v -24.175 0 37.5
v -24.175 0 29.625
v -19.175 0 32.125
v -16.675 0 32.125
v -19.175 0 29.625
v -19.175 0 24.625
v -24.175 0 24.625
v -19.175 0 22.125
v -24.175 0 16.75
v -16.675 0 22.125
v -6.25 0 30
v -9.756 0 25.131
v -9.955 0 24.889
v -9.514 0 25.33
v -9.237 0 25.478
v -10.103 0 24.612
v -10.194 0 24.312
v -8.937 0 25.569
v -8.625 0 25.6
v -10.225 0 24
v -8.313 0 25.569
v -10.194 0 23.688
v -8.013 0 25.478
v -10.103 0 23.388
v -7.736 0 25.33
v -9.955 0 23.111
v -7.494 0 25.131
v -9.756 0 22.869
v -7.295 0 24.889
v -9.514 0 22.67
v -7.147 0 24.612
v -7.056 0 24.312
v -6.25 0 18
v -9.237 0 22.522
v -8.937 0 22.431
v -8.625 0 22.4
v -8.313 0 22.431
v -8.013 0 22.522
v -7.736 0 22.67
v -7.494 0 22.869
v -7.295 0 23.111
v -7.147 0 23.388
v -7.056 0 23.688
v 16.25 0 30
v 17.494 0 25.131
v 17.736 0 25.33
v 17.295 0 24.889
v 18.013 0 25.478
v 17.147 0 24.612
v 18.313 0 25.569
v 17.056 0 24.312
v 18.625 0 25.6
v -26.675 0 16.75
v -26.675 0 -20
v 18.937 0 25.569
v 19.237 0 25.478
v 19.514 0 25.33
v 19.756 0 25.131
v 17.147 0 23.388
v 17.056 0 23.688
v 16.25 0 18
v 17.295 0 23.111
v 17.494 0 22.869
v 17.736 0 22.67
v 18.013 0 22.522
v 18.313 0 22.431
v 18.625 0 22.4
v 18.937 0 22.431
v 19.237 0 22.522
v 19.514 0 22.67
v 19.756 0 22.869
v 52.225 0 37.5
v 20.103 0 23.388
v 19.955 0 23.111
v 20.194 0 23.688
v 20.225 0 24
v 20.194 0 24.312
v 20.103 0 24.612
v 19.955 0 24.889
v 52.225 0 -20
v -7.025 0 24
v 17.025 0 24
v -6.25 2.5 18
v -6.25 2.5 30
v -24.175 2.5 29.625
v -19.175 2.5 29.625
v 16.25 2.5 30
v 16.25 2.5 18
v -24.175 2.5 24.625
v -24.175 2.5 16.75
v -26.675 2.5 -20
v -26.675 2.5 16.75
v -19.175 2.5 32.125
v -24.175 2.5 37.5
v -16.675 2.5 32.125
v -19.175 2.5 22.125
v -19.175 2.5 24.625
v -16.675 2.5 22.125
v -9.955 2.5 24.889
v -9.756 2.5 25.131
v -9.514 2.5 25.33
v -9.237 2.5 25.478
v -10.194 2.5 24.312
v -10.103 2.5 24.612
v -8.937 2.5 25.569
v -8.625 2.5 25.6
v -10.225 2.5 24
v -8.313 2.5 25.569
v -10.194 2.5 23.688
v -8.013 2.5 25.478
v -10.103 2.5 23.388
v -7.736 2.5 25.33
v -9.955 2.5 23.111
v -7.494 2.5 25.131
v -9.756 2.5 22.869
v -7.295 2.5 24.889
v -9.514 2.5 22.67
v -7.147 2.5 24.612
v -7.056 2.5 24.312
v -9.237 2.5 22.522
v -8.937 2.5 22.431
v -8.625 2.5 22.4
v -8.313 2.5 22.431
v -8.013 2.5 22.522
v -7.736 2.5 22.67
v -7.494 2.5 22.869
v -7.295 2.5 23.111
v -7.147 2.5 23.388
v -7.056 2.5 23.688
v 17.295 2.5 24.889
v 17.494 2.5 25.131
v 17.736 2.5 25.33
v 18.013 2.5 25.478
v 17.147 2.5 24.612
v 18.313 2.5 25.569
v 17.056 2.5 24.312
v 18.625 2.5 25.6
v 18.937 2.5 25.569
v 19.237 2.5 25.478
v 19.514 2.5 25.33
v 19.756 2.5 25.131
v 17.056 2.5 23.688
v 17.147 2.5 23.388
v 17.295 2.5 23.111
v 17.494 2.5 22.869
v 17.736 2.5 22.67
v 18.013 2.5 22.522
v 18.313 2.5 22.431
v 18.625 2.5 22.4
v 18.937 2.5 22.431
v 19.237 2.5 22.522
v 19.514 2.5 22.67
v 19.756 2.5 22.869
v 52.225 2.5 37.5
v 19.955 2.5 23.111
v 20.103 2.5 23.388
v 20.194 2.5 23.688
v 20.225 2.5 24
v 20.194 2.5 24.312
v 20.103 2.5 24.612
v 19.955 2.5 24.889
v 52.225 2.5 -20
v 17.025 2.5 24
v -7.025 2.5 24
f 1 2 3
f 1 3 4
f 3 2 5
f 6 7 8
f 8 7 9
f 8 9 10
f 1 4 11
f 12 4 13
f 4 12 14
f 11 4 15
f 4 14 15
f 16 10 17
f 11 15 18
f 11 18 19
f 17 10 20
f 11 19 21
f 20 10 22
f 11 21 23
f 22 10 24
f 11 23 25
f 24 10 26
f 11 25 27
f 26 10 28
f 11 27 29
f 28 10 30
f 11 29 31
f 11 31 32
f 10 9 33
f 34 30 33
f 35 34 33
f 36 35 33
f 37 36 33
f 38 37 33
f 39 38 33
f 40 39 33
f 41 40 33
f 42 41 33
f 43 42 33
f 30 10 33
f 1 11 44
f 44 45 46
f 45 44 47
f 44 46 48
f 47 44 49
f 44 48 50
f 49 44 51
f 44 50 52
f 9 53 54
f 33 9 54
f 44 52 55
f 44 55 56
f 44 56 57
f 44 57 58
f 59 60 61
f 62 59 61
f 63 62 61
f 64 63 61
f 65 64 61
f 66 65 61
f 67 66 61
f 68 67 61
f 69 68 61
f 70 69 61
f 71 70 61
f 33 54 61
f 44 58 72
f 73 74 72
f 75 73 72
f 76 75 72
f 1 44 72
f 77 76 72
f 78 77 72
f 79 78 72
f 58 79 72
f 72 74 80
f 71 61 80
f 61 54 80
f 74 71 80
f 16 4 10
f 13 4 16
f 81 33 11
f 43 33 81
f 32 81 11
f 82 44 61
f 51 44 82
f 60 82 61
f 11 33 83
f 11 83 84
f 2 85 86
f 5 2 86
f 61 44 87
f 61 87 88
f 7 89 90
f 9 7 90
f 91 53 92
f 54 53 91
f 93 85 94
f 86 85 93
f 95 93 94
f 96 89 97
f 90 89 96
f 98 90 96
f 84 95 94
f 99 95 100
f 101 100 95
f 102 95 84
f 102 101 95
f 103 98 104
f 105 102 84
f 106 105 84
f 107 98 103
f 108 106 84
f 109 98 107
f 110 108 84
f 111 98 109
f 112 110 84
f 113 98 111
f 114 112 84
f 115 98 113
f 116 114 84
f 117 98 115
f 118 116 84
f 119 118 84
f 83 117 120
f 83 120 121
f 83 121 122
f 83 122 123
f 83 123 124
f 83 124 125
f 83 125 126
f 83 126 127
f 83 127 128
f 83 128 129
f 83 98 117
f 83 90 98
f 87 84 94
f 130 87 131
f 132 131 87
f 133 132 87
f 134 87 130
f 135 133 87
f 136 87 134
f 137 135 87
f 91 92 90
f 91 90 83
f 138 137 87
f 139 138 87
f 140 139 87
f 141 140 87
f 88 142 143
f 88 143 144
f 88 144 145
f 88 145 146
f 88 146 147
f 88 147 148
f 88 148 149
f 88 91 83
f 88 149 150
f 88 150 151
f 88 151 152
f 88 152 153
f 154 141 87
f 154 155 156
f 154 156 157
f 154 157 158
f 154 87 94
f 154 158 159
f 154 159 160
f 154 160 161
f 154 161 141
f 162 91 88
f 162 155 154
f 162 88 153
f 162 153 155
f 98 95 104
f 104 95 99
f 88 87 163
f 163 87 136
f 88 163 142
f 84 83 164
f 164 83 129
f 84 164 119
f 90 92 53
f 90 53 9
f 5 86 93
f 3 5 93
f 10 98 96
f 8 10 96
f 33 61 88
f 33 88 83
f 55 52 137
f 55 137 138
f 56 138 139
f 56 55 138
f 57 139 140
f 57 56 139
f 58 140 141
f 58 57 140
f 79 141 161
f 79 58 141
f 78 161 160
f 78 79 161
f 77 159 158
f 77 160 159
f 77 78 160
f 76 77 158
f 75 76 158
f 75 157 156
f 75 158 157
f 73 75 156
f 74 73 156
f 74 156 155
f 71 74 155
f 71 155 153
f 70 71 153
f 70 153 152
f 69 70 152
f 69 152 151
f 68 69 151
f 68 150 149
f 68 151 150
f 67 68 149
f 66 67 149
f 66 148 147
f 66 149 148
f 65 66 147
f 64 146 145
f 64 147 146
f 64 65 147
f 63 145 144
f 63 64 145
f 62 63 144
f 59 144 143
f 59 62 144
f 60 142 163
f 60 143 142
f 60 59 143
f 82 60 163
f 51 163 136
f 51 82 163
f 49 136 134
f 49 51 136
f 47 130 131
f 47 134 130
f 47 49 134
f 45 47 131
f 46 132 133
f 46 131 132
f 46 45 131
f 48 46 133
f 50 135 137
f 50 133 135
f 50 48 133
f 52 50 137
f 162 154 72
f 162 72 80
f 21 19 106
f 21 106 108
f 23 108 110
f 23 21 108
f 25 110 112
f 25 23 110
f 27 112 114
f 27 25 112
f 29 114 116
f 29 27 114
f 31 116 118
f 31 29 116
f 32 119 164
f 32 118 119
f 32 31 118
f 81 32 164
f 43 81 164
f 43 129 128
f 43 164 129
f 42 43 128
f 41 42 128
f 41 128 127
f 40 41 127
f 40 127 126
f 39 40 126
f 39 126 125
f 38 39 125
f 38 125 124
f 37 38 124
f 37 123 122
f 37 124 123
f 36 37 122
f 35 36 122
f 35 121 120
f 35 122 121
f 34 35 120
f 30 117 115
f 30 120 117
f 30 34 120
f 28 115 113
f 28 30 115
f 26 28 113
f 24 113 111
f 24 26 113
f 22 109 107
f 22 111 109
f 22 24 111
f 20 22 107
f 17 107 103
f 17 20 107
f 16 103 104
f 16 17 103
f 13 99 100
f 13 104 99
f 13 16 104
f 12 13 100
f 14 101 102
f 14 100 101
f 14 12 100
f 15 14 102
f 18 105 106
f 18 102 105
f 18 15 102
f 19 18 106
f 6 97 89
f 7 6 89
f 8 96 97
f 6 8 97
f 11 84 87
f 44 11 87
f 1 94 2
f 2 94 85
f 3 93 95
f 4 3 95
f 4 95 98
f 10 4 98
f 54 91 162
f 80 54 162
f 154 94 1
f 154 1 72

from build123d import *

# Parameters (mm, degrees)
SKETCH1_W               = 80
SKETCH1_H               = 60
BOSS_EXTRUDE1_DEPTH     = 2.5
CUT_EXTRUDE4_DEPTH      = 51.062460986
CUT_EXTRUDE4_DEPTH_BACK = 51.062460986
SKETCH2_R               = 1.6
SKETCH3_W               = 2.5
SKETCH3_H               = 20.5
BOSS_EXTRUDE2_DEPTH     = 66.5
SKETCH4_W               = 80
SKETCH4_H               = 5.5
BOSS_EXTRUDE3_DEPTH     = 2.5
SKETCH5_W               = 2.5
SKETCH5_H               = 5.5
BOSS_EXTRUDE4_DEPTH     = 66.5
SKETCH6_W               = 2.5
SKETCH6_H               = 5.5
CUT_EXTRUDE5_DEPTH      = 66.5
SKETCH9_W               = 2.5
SKETCH9_H               = 2.5
BOSS_EXTRUDE5_DEPTH     = 66.5
SKETCH11_R              = 4.75
CUT_EXTRUDE6_DEPTH      = 2.5
SKETCH15_W              = 2.5
SKETCH15_H              = 23
BOSS_EXTRUDE6_DEPTH     = 8
SKETCH17_W              = 2.5
SKETCH17_H              = 74.5
BOSS_EXTRUDE7_DEPTH     = 2
SKETCH18_R              = 1.6
CUT_EXTRUDE7_DEPTH      = 2.5
SKETCH21_W              = 80
SKETCH21_H              = 2.5
BOSS_EXTRUDE8_DEPTH     = 2
SKETCH22_W              = 4.25
SKETCH22_H              = 74.5
CUT_EXTRUDE8_DEPTH      = 2.5
FILLET1_R               = 5
SKETCH23_W              = 15.225
SKETCH23_H              = 67.5
BOSS_EXTRUDE10_DEPTH    = 2.5
SKETCH24_W              = 95.225
SKETCH24_H              = 10
CUT_EXTRUDE9_DEPTH      = 101.031498164
SKETCH26_W              = 2.5
SKETCH26_H              = 20.75
BOSS_EXTRUDE11_DEPTH    = 74.5
SKETCH27_R              = 1.6
CUT_EXTRUDE10_DEPTH     = 2.5
SKETCH28_W              = 2.5
SKETCH28_H              = 20.75
CUT_EXTRUDE11_DEPTH     = 74.5
SKETCH29_W              = 20.75
SKETCH29_H              = 19.625
CUT_EXTRUDE12_DEPTH     = 2.5
FILLET2_R               = 6
SKETCH31_W              = 13.325
SKETCH31_H              = 57.5
CUT_EXTRUDE13_DEPTH     = 2.5
SKETCH33_W              = 3
SKETCH33_H              = 57.5
CUT_EXTRUDE14_DEPTH     = 2.5
CUT_EXTRUDE15_DEPTH     = 2.5
SKETCH35_W              = 2.5
SKETCH35_H              = 20.75
CUT_EXTRUDE16_DEPTH     = 57.375


with BuildPart() as part:
    # Sketch1 → Boss-Extrude1 (new body)
    with BuildSketch(Plane(origin=(0, 0, 0), x_dir=(1, 0, 0), z_dir=(0, 1, 0))):
        Rectangle(SKETCH1_W, SKETCH1_H)
    extrude(amount=BOSS_EXTRUDE1_DEPTH)

    # Sketch2 → Cut-Extrude4 (cut, two sides: drawn at the far end of the back side and taken through both)
    with BuildSketch(Plane(origin=(0, 0, 0), x_dir=(1, 0, 0), z_dir=(0, 1, 0)).offset(-CUT_EXTRUDE4_DEPTH_BACK)):
        with BuildLine():
            Line((-6.25, -24), (-2.5, -24))
            ThreePointArc((-2.5, -24), (0, -21.5), (2.5, -24))
            Line((2.5, -24), (16.25, -24))
            Line((16.25, -24), (16.25, -18))
            Line((16.25, -18), (-6.25, -18))
            Line((-6.25, -18), (-6.25, -24))
        make_face()
        with BuildLine():
            Line((0, -26.5), (0, -30))
            Line((0, -30), (16.25, -30))
            Line((16.25, -30), (16.25, -24))
            Line((16.25, -24), (2.5, -24))
            ThreePointArc((2.5, -24), (1.767766953, -25.767766953), (0, -26.5))
        make_face()
        with BuildLine():
            ThreePointArc((-2.5, -24), (-1.767766953, -25.767766953), (0, -26.5))
            Line((0, -26.5), (0, -24))
            Line((0, -24), (-2.5, -24))
        make_face()
        with BuildLine():
            Line((0, -24), (0, -26.5))
            ThreePointArc((0, -26.5), (1.767766953, -25.767766953), (2.5, -24))
            Line((2.5, -24), (0, -24))
        make_face()
        with BuildLine():
            Line((-2.5, -24), (0, -24))
            Line((0, -24), (2.5, -24))
            ThreePointArc((2.5, -24), (0, -21.5), (-2.5, -24))
        make_face()
        with BuildLine():
            ThreePointArc((-2.5, -24), (-1.767766953, -25.767766953), (0, -26.5))
            Line((0, -26.5), (0, -24))
            Line((0, -24), (-2.5, -24))
        make_face()
        with BuildLine():
            Line((0, -24), (0, -26.5))
            ThreePointArc((0, -26.5), (1.767766953, -25.767766953), (2.5, -24))
            Line((2.5, -24), (0, -24))
        make_face()
        with BuildLine():
            Line((-6.25, -30), (0, -30))
            Line((0, -30), (0, -26.5))
            ThreePointArc((0, -26.5), (-1.767766953, -25.767766953), (-2.5, -24))
            Line((-2.5, -24), (-6.25, -24))
            Line((-6.25, -24), (-6.25, -30))
        make_face()
        with Locations(Location((-8.625, -24, 0), (0, 0, 270))):
            Circle(SKETCH2_R)
        with Locations(Location((18.625, -24, 0), (0, 0, 270))):
            Circle(SKETCH2_R)
    extrude(amount=CUT_EXTRUDE4_DEPTH + CUT_EXTRUDE4_DEPTH_BACK, mode=Mode.SUBTRACT)

    # Sketch3 → Boss-Extrude2 (add)
    with BuildSketch(Plane(origin=(0, 2.5, 0), x_dir=(1, 0, 0), z_dir=(0, 1, 0))):
        with Locations((-38.75, -19.75)):
            Rectangle(SKETCH3_W, SKETCH3_H)
    extrude(amount=BOSS_EXTRUDE2_DEPTH)

    # Sketch4 → Boss-Extrude3 (add)
    with BuildSketch(Plane(origin=(0, 2.5, 0), x_dir=(1, 0, 0), z_dir=(0, 1, 0))):
        with Locations((0, -32.75)):
            Rectangle(SKETCH4_W, SKETCH4_H)
    extrude(amount=-BOSS_EXTRUDE3_DEPTH)

    # Sketch5 → Boss-Extrude4 (add)
    with BuildSketch(Plane(origin=(0, 2.5, 0), x_dir=(1, 0, 0), z_dir=(0, 1, 0))):
        with Locations((-38.75, -32.75)):
            Rectangle(SKETCH5_W, SKETCH5_H)
    extrude(amount=BOSS_EXTRUDE4_DEPTH)

    # Sketch6 → Cut-Extrude5 (cut)
    with BuildSketch(Plane(origin=(0, 69, 0), x_dir=(1, 0, 0), z_dir=(0, 1, 0))):
        with Locations((-38.75, -12.25)):
            Rectangle(SKETCH6_W, SKETCH6_H)
    extrude(amount=-CUT_EXTRUDE5_DEPTH, mode=Mode.SUBTRACT)

    # Sketch9 → Boss-Extrude5 (add)
    with BuildSketch(Plane(origin=(0, 2.5, 0), x_dir=(1, 0, 0), z_dir=(0, 1, 0))):
        with Locations((-38.75, -13.75)):
            Rectangle(SKETCH9_W, SKETCH9_H)
    extrude(amount=BOSS_EXTRUDE5_DEPTH)

    # Sketch11 → Cut-Extrude6 (cut)
    with BuildSketch(Plane(origin=(-37.5, 0, 0), x_dir=(0, 0, -1), z_dir=(1, 0, 0))):
        with Locations((-24, 54)):
            Circle(SKETCH11_R)
    extrude(amount=-CUT_EXTRUDE6_DEPTH, mode=Mode.SUBTRACT)

    # Sketch15 → Boss-Extrude6 (add)
    with BuildSketch(Plane(origin=(0, 69, 0), x_dir=(1, 0, 0), z_dir=(0, 1, 0))):
        with Locations((-38.75, -24)):
            Rectangle(SKETCH15_W, SKETCH15_H)
    extrude(amount=BOSS_EXTRUDE6_DEPTH)

    # Sketch17 → Boss-Extrude7 (add)
    with BuildSketch(Plane.XY.offset(35.5)):
        with Locations((-38.75, 39.75)):
            Rectangle(SKETCH17_W, SKETCH17_H)
    extrude(amount=BOSS_EXTRUDE7_DEPTH)

    # Sketch18 → Cut-Extrude7 (cut)
    with BuildSketch(Plane.ZY.offset(40)):
        with Locations((32, 36.5)):
            Circle(SKETCH18_R)
        with Locations((32, 71.5)):
            Circle(SKETCH18_R)
    extrude(amount=-CUT_EXTRUDE7_DEPTH, mode=Mode.SUBTRACT)

    # Sketch21 → Boss-Extrude8 (add)
    with BuildSketch(Plane.XY.offset(35.5)):
        with Locations((0, 1.25)):
            Rectangle(SKETCH21_W, SKETCH21_H)
    extrude(amount=BOSS_EXTRUDE8_DEPTH)

    # Sketch22 → Cut-Extrude8 (cut)
    with BuildSketch(Plane(origin=(-37.5, 0, 0), x_dir=(0, 0, -1), z_dir=(1, 0, 0))):
        with Locations((-14.625, 39.75)):
            Rectangle(SKETCH22_W, SKETCH22_H)
    extrude(amount=-CUT_EXTRUDE8_DEPTH, mode=Mode.SUBTRACT)

    # Fillet1
    fillet1_edges = [part.edges().sort_by_distance(p)[0] for p in [
        (-38.75, 77, 37.5),
        (-38.75, 77, 16.75),
    ]]
    fillet(fillet1_edges, radius=FILLET1_R)

    # Sketch23 → Boss-Extrude10 (add)
    with BuildSketch(Plane(origin=(0, 2.5, 0), x_dir=(1, 0, 0), z_dir=(0, 1, 0))):
        with Locations((47.6125, -3.75)):
            Rectangle(SKETCH23_W, SKETCH23_H)
    extrude(amount=-BOSS_EXTRUDE10_DEPTH)

    # Sketch24 → Cut-Extrude9 (cut, through all)
    with BuildSketch(Plane(origin=(0, 2.5, 0), x_dir=(1, 0, 0), z_dir=(0, 1, 0))):
        with Locations((7.6125, 25)):
            Rectangle(SKETCH24_W, SKETCH24_H)
    extrude(amount=-CUT_EXTRUDE9_DEPTH, mode=Mode.SUBTRACT)

    # Sketch26 → Boss-Extrude11 (add)
    with BuildSketch(Plane(origin=(0, 2.5, 0), x_dir=(1, 0, 0), z_dir=(0, 1, 0))):
        with Locations((-25.425, -27.125)):
            Rectangle(SKETCH26_W, SKETCH26_H)
    extrude(amount=BOSS_EXTRUDE11_DEPTH)

    # Sketch27 → Cut-Extrude10 (cut)
    with BuildSketch(Plane(origin=(-24.175, 0, 0), x_dir=(0, 0, -1), z_dir=(1, 0, 0))):
        with BuildLine():
            ThreePointArc((-28.75, 36.275), (-27.358757211, 32.916242789), (-24, 31.525))
            Line((-24, 31.525), (-24, 36.275))
            Line((-24, 36.275), (-28.75, 36.275))
        make_face()
        with BuildLine():
            Line((-24, 36.275), (-24, 31.525))
            ThreePointArc((-24, 31.525), (-20.641242789, 32.916242789), (-19.25, 36.275))
            ThreePointArc((-19.25, 36.275), (-24, 41.025), (-28.75, 36.275))
            Line((-28.75, 36.275), (-24, 36.275))
        make_face()
        with BuildLine():
            ThreePointArc((-28.75, 36.275), (-27.358757211, 32.916242789), (-24, 31.525))
            Line((-24, 31.525), (-24, 36.275))
            Line((-24, 36.275), (-28.75, 36.275))
        make_face()
        with BuildLine():
            Line((-24, 36.275), (-24, 31.525))
            ThreePointArc((-24, 31.525), (-20.641242789, 32.916242789), (-19.25, 36.275))
            ThreePointArc((-19.25, 36.275), (-24, 41.025), (-28.75, 36.275))
            Line((-28.75, 36.275), (-24, 36.275))
        make_face()
        with Locations((-32, 18.775)):
            Circle(SKETCH27_R)
        with Locations((-32, 53.775)):
            Circle(SKETCH27_R)
    extrude(amount=-CUT_EXTRUDE10_DEPTH, mode=Mode.SUBTRACT)

    # Sketch28 → Cut-Extrude11 (cut)
    with BuildSketch(Plane(origin=(0, 77, 0), x_dir=(1, 0, 0), z_dir=(0, 1, 0))):
        with Locations((-38.75, -27.125)):
            Rectangle(SKETCH28_W, SKETCH28_H)
    extrude(amount=-CUT_EXTRUDE11_DEPTH, mode=Mode.SUBTRACT)

    # Sketch29 → Cut-Extrude12 (cut)
    with BuildSketch(Plane(origin=(-24.175, 0, 0), x_dir=(0, 0, -1), z_dir=(1, 0, 0))):
        with Locations((-27.125, 67.1875)):
            Rectangle(SKETCH29_W, SKETCH29_H)
    extrude(amount=-CUT_EXTRUDE12_DEPTH, mode=Mode.SUBTRACT)

    # Fillet2
    fillet2_edges = [part.edges().sort_by_distance(p)[0] for p in [
        (-25.425, 57.375, 37.5),
        (-25.425, 57.375, 16.75),
    ]]
    fillet(fillet2_edges, radius=FILLET2_R)

    # Sketch31 → Cut-Extrude13 (cut)
    with BuildSketch(Plane(origin=(0, 2.5, 0), x_dir=(1, 0, 0), z_dir=(0, 1, 0))):
        with Locations((-33.3375, -8.75)):
            Rectangle(SKETCH31_W, SKETCH31_H)
    extrude(amount=-CUT_EXTRUDE13_DEPTH, mode=Mode.SUBTRACT)

    # Sketch33 → Cut-Extrude14 (cut)
    with BuildSketch(Plane(origin=(0, 2.5, 0), x_dir=(1, 0, 0), z_dir=(0, 1, 0))):
        with Locations((53.725, -8.75)):
            Rectangle(SKETCH33_W, SKETCH33_H)
    extrude(amount=-CUT_EXTRUDE14_DEPTH, mode=Mode.SUBTRACT)

    # Sketch34 → Cut-Extrude15 (cut)
    with BuildSketch(Plane(origin=(0, 2.5, 0), x_dir=(1, 0, 0), z_dir=(0, 1, 0))):
        Polygon((-24.175, -24.625), (-24.175, -27.125), (-24.175, -29.625), (-19.175, -29.625), (-19.175, -24.625), align=None)
        Polygon((-19.175, -22.125), (-19.175, -24.625), (-19.175, -29.625), (-19.175, -32.125), (-16.675, -32.125), (-16.675, -22.125), align=None)
    extrude(amount=-CUT_EXTRUDE15_DEPTH, mode=Mode.SUBTRACT)

    # Sketch35 → Cut-Extrude16 (cut)
    with BuildSketch(Plane(origin=(0, 57.375, 0), x_dir=(1, 0, 0), z_dir=(0, 1, 0))):
        with Locations((-25.425, -27.125)):
            Rectangle(SKETCH35_W, SKETCH35_H)
    extrude(amount=-CUT_EXTRUDE16_DEPTH, mode=Mode.SUBTRACT)


solid = part.part
